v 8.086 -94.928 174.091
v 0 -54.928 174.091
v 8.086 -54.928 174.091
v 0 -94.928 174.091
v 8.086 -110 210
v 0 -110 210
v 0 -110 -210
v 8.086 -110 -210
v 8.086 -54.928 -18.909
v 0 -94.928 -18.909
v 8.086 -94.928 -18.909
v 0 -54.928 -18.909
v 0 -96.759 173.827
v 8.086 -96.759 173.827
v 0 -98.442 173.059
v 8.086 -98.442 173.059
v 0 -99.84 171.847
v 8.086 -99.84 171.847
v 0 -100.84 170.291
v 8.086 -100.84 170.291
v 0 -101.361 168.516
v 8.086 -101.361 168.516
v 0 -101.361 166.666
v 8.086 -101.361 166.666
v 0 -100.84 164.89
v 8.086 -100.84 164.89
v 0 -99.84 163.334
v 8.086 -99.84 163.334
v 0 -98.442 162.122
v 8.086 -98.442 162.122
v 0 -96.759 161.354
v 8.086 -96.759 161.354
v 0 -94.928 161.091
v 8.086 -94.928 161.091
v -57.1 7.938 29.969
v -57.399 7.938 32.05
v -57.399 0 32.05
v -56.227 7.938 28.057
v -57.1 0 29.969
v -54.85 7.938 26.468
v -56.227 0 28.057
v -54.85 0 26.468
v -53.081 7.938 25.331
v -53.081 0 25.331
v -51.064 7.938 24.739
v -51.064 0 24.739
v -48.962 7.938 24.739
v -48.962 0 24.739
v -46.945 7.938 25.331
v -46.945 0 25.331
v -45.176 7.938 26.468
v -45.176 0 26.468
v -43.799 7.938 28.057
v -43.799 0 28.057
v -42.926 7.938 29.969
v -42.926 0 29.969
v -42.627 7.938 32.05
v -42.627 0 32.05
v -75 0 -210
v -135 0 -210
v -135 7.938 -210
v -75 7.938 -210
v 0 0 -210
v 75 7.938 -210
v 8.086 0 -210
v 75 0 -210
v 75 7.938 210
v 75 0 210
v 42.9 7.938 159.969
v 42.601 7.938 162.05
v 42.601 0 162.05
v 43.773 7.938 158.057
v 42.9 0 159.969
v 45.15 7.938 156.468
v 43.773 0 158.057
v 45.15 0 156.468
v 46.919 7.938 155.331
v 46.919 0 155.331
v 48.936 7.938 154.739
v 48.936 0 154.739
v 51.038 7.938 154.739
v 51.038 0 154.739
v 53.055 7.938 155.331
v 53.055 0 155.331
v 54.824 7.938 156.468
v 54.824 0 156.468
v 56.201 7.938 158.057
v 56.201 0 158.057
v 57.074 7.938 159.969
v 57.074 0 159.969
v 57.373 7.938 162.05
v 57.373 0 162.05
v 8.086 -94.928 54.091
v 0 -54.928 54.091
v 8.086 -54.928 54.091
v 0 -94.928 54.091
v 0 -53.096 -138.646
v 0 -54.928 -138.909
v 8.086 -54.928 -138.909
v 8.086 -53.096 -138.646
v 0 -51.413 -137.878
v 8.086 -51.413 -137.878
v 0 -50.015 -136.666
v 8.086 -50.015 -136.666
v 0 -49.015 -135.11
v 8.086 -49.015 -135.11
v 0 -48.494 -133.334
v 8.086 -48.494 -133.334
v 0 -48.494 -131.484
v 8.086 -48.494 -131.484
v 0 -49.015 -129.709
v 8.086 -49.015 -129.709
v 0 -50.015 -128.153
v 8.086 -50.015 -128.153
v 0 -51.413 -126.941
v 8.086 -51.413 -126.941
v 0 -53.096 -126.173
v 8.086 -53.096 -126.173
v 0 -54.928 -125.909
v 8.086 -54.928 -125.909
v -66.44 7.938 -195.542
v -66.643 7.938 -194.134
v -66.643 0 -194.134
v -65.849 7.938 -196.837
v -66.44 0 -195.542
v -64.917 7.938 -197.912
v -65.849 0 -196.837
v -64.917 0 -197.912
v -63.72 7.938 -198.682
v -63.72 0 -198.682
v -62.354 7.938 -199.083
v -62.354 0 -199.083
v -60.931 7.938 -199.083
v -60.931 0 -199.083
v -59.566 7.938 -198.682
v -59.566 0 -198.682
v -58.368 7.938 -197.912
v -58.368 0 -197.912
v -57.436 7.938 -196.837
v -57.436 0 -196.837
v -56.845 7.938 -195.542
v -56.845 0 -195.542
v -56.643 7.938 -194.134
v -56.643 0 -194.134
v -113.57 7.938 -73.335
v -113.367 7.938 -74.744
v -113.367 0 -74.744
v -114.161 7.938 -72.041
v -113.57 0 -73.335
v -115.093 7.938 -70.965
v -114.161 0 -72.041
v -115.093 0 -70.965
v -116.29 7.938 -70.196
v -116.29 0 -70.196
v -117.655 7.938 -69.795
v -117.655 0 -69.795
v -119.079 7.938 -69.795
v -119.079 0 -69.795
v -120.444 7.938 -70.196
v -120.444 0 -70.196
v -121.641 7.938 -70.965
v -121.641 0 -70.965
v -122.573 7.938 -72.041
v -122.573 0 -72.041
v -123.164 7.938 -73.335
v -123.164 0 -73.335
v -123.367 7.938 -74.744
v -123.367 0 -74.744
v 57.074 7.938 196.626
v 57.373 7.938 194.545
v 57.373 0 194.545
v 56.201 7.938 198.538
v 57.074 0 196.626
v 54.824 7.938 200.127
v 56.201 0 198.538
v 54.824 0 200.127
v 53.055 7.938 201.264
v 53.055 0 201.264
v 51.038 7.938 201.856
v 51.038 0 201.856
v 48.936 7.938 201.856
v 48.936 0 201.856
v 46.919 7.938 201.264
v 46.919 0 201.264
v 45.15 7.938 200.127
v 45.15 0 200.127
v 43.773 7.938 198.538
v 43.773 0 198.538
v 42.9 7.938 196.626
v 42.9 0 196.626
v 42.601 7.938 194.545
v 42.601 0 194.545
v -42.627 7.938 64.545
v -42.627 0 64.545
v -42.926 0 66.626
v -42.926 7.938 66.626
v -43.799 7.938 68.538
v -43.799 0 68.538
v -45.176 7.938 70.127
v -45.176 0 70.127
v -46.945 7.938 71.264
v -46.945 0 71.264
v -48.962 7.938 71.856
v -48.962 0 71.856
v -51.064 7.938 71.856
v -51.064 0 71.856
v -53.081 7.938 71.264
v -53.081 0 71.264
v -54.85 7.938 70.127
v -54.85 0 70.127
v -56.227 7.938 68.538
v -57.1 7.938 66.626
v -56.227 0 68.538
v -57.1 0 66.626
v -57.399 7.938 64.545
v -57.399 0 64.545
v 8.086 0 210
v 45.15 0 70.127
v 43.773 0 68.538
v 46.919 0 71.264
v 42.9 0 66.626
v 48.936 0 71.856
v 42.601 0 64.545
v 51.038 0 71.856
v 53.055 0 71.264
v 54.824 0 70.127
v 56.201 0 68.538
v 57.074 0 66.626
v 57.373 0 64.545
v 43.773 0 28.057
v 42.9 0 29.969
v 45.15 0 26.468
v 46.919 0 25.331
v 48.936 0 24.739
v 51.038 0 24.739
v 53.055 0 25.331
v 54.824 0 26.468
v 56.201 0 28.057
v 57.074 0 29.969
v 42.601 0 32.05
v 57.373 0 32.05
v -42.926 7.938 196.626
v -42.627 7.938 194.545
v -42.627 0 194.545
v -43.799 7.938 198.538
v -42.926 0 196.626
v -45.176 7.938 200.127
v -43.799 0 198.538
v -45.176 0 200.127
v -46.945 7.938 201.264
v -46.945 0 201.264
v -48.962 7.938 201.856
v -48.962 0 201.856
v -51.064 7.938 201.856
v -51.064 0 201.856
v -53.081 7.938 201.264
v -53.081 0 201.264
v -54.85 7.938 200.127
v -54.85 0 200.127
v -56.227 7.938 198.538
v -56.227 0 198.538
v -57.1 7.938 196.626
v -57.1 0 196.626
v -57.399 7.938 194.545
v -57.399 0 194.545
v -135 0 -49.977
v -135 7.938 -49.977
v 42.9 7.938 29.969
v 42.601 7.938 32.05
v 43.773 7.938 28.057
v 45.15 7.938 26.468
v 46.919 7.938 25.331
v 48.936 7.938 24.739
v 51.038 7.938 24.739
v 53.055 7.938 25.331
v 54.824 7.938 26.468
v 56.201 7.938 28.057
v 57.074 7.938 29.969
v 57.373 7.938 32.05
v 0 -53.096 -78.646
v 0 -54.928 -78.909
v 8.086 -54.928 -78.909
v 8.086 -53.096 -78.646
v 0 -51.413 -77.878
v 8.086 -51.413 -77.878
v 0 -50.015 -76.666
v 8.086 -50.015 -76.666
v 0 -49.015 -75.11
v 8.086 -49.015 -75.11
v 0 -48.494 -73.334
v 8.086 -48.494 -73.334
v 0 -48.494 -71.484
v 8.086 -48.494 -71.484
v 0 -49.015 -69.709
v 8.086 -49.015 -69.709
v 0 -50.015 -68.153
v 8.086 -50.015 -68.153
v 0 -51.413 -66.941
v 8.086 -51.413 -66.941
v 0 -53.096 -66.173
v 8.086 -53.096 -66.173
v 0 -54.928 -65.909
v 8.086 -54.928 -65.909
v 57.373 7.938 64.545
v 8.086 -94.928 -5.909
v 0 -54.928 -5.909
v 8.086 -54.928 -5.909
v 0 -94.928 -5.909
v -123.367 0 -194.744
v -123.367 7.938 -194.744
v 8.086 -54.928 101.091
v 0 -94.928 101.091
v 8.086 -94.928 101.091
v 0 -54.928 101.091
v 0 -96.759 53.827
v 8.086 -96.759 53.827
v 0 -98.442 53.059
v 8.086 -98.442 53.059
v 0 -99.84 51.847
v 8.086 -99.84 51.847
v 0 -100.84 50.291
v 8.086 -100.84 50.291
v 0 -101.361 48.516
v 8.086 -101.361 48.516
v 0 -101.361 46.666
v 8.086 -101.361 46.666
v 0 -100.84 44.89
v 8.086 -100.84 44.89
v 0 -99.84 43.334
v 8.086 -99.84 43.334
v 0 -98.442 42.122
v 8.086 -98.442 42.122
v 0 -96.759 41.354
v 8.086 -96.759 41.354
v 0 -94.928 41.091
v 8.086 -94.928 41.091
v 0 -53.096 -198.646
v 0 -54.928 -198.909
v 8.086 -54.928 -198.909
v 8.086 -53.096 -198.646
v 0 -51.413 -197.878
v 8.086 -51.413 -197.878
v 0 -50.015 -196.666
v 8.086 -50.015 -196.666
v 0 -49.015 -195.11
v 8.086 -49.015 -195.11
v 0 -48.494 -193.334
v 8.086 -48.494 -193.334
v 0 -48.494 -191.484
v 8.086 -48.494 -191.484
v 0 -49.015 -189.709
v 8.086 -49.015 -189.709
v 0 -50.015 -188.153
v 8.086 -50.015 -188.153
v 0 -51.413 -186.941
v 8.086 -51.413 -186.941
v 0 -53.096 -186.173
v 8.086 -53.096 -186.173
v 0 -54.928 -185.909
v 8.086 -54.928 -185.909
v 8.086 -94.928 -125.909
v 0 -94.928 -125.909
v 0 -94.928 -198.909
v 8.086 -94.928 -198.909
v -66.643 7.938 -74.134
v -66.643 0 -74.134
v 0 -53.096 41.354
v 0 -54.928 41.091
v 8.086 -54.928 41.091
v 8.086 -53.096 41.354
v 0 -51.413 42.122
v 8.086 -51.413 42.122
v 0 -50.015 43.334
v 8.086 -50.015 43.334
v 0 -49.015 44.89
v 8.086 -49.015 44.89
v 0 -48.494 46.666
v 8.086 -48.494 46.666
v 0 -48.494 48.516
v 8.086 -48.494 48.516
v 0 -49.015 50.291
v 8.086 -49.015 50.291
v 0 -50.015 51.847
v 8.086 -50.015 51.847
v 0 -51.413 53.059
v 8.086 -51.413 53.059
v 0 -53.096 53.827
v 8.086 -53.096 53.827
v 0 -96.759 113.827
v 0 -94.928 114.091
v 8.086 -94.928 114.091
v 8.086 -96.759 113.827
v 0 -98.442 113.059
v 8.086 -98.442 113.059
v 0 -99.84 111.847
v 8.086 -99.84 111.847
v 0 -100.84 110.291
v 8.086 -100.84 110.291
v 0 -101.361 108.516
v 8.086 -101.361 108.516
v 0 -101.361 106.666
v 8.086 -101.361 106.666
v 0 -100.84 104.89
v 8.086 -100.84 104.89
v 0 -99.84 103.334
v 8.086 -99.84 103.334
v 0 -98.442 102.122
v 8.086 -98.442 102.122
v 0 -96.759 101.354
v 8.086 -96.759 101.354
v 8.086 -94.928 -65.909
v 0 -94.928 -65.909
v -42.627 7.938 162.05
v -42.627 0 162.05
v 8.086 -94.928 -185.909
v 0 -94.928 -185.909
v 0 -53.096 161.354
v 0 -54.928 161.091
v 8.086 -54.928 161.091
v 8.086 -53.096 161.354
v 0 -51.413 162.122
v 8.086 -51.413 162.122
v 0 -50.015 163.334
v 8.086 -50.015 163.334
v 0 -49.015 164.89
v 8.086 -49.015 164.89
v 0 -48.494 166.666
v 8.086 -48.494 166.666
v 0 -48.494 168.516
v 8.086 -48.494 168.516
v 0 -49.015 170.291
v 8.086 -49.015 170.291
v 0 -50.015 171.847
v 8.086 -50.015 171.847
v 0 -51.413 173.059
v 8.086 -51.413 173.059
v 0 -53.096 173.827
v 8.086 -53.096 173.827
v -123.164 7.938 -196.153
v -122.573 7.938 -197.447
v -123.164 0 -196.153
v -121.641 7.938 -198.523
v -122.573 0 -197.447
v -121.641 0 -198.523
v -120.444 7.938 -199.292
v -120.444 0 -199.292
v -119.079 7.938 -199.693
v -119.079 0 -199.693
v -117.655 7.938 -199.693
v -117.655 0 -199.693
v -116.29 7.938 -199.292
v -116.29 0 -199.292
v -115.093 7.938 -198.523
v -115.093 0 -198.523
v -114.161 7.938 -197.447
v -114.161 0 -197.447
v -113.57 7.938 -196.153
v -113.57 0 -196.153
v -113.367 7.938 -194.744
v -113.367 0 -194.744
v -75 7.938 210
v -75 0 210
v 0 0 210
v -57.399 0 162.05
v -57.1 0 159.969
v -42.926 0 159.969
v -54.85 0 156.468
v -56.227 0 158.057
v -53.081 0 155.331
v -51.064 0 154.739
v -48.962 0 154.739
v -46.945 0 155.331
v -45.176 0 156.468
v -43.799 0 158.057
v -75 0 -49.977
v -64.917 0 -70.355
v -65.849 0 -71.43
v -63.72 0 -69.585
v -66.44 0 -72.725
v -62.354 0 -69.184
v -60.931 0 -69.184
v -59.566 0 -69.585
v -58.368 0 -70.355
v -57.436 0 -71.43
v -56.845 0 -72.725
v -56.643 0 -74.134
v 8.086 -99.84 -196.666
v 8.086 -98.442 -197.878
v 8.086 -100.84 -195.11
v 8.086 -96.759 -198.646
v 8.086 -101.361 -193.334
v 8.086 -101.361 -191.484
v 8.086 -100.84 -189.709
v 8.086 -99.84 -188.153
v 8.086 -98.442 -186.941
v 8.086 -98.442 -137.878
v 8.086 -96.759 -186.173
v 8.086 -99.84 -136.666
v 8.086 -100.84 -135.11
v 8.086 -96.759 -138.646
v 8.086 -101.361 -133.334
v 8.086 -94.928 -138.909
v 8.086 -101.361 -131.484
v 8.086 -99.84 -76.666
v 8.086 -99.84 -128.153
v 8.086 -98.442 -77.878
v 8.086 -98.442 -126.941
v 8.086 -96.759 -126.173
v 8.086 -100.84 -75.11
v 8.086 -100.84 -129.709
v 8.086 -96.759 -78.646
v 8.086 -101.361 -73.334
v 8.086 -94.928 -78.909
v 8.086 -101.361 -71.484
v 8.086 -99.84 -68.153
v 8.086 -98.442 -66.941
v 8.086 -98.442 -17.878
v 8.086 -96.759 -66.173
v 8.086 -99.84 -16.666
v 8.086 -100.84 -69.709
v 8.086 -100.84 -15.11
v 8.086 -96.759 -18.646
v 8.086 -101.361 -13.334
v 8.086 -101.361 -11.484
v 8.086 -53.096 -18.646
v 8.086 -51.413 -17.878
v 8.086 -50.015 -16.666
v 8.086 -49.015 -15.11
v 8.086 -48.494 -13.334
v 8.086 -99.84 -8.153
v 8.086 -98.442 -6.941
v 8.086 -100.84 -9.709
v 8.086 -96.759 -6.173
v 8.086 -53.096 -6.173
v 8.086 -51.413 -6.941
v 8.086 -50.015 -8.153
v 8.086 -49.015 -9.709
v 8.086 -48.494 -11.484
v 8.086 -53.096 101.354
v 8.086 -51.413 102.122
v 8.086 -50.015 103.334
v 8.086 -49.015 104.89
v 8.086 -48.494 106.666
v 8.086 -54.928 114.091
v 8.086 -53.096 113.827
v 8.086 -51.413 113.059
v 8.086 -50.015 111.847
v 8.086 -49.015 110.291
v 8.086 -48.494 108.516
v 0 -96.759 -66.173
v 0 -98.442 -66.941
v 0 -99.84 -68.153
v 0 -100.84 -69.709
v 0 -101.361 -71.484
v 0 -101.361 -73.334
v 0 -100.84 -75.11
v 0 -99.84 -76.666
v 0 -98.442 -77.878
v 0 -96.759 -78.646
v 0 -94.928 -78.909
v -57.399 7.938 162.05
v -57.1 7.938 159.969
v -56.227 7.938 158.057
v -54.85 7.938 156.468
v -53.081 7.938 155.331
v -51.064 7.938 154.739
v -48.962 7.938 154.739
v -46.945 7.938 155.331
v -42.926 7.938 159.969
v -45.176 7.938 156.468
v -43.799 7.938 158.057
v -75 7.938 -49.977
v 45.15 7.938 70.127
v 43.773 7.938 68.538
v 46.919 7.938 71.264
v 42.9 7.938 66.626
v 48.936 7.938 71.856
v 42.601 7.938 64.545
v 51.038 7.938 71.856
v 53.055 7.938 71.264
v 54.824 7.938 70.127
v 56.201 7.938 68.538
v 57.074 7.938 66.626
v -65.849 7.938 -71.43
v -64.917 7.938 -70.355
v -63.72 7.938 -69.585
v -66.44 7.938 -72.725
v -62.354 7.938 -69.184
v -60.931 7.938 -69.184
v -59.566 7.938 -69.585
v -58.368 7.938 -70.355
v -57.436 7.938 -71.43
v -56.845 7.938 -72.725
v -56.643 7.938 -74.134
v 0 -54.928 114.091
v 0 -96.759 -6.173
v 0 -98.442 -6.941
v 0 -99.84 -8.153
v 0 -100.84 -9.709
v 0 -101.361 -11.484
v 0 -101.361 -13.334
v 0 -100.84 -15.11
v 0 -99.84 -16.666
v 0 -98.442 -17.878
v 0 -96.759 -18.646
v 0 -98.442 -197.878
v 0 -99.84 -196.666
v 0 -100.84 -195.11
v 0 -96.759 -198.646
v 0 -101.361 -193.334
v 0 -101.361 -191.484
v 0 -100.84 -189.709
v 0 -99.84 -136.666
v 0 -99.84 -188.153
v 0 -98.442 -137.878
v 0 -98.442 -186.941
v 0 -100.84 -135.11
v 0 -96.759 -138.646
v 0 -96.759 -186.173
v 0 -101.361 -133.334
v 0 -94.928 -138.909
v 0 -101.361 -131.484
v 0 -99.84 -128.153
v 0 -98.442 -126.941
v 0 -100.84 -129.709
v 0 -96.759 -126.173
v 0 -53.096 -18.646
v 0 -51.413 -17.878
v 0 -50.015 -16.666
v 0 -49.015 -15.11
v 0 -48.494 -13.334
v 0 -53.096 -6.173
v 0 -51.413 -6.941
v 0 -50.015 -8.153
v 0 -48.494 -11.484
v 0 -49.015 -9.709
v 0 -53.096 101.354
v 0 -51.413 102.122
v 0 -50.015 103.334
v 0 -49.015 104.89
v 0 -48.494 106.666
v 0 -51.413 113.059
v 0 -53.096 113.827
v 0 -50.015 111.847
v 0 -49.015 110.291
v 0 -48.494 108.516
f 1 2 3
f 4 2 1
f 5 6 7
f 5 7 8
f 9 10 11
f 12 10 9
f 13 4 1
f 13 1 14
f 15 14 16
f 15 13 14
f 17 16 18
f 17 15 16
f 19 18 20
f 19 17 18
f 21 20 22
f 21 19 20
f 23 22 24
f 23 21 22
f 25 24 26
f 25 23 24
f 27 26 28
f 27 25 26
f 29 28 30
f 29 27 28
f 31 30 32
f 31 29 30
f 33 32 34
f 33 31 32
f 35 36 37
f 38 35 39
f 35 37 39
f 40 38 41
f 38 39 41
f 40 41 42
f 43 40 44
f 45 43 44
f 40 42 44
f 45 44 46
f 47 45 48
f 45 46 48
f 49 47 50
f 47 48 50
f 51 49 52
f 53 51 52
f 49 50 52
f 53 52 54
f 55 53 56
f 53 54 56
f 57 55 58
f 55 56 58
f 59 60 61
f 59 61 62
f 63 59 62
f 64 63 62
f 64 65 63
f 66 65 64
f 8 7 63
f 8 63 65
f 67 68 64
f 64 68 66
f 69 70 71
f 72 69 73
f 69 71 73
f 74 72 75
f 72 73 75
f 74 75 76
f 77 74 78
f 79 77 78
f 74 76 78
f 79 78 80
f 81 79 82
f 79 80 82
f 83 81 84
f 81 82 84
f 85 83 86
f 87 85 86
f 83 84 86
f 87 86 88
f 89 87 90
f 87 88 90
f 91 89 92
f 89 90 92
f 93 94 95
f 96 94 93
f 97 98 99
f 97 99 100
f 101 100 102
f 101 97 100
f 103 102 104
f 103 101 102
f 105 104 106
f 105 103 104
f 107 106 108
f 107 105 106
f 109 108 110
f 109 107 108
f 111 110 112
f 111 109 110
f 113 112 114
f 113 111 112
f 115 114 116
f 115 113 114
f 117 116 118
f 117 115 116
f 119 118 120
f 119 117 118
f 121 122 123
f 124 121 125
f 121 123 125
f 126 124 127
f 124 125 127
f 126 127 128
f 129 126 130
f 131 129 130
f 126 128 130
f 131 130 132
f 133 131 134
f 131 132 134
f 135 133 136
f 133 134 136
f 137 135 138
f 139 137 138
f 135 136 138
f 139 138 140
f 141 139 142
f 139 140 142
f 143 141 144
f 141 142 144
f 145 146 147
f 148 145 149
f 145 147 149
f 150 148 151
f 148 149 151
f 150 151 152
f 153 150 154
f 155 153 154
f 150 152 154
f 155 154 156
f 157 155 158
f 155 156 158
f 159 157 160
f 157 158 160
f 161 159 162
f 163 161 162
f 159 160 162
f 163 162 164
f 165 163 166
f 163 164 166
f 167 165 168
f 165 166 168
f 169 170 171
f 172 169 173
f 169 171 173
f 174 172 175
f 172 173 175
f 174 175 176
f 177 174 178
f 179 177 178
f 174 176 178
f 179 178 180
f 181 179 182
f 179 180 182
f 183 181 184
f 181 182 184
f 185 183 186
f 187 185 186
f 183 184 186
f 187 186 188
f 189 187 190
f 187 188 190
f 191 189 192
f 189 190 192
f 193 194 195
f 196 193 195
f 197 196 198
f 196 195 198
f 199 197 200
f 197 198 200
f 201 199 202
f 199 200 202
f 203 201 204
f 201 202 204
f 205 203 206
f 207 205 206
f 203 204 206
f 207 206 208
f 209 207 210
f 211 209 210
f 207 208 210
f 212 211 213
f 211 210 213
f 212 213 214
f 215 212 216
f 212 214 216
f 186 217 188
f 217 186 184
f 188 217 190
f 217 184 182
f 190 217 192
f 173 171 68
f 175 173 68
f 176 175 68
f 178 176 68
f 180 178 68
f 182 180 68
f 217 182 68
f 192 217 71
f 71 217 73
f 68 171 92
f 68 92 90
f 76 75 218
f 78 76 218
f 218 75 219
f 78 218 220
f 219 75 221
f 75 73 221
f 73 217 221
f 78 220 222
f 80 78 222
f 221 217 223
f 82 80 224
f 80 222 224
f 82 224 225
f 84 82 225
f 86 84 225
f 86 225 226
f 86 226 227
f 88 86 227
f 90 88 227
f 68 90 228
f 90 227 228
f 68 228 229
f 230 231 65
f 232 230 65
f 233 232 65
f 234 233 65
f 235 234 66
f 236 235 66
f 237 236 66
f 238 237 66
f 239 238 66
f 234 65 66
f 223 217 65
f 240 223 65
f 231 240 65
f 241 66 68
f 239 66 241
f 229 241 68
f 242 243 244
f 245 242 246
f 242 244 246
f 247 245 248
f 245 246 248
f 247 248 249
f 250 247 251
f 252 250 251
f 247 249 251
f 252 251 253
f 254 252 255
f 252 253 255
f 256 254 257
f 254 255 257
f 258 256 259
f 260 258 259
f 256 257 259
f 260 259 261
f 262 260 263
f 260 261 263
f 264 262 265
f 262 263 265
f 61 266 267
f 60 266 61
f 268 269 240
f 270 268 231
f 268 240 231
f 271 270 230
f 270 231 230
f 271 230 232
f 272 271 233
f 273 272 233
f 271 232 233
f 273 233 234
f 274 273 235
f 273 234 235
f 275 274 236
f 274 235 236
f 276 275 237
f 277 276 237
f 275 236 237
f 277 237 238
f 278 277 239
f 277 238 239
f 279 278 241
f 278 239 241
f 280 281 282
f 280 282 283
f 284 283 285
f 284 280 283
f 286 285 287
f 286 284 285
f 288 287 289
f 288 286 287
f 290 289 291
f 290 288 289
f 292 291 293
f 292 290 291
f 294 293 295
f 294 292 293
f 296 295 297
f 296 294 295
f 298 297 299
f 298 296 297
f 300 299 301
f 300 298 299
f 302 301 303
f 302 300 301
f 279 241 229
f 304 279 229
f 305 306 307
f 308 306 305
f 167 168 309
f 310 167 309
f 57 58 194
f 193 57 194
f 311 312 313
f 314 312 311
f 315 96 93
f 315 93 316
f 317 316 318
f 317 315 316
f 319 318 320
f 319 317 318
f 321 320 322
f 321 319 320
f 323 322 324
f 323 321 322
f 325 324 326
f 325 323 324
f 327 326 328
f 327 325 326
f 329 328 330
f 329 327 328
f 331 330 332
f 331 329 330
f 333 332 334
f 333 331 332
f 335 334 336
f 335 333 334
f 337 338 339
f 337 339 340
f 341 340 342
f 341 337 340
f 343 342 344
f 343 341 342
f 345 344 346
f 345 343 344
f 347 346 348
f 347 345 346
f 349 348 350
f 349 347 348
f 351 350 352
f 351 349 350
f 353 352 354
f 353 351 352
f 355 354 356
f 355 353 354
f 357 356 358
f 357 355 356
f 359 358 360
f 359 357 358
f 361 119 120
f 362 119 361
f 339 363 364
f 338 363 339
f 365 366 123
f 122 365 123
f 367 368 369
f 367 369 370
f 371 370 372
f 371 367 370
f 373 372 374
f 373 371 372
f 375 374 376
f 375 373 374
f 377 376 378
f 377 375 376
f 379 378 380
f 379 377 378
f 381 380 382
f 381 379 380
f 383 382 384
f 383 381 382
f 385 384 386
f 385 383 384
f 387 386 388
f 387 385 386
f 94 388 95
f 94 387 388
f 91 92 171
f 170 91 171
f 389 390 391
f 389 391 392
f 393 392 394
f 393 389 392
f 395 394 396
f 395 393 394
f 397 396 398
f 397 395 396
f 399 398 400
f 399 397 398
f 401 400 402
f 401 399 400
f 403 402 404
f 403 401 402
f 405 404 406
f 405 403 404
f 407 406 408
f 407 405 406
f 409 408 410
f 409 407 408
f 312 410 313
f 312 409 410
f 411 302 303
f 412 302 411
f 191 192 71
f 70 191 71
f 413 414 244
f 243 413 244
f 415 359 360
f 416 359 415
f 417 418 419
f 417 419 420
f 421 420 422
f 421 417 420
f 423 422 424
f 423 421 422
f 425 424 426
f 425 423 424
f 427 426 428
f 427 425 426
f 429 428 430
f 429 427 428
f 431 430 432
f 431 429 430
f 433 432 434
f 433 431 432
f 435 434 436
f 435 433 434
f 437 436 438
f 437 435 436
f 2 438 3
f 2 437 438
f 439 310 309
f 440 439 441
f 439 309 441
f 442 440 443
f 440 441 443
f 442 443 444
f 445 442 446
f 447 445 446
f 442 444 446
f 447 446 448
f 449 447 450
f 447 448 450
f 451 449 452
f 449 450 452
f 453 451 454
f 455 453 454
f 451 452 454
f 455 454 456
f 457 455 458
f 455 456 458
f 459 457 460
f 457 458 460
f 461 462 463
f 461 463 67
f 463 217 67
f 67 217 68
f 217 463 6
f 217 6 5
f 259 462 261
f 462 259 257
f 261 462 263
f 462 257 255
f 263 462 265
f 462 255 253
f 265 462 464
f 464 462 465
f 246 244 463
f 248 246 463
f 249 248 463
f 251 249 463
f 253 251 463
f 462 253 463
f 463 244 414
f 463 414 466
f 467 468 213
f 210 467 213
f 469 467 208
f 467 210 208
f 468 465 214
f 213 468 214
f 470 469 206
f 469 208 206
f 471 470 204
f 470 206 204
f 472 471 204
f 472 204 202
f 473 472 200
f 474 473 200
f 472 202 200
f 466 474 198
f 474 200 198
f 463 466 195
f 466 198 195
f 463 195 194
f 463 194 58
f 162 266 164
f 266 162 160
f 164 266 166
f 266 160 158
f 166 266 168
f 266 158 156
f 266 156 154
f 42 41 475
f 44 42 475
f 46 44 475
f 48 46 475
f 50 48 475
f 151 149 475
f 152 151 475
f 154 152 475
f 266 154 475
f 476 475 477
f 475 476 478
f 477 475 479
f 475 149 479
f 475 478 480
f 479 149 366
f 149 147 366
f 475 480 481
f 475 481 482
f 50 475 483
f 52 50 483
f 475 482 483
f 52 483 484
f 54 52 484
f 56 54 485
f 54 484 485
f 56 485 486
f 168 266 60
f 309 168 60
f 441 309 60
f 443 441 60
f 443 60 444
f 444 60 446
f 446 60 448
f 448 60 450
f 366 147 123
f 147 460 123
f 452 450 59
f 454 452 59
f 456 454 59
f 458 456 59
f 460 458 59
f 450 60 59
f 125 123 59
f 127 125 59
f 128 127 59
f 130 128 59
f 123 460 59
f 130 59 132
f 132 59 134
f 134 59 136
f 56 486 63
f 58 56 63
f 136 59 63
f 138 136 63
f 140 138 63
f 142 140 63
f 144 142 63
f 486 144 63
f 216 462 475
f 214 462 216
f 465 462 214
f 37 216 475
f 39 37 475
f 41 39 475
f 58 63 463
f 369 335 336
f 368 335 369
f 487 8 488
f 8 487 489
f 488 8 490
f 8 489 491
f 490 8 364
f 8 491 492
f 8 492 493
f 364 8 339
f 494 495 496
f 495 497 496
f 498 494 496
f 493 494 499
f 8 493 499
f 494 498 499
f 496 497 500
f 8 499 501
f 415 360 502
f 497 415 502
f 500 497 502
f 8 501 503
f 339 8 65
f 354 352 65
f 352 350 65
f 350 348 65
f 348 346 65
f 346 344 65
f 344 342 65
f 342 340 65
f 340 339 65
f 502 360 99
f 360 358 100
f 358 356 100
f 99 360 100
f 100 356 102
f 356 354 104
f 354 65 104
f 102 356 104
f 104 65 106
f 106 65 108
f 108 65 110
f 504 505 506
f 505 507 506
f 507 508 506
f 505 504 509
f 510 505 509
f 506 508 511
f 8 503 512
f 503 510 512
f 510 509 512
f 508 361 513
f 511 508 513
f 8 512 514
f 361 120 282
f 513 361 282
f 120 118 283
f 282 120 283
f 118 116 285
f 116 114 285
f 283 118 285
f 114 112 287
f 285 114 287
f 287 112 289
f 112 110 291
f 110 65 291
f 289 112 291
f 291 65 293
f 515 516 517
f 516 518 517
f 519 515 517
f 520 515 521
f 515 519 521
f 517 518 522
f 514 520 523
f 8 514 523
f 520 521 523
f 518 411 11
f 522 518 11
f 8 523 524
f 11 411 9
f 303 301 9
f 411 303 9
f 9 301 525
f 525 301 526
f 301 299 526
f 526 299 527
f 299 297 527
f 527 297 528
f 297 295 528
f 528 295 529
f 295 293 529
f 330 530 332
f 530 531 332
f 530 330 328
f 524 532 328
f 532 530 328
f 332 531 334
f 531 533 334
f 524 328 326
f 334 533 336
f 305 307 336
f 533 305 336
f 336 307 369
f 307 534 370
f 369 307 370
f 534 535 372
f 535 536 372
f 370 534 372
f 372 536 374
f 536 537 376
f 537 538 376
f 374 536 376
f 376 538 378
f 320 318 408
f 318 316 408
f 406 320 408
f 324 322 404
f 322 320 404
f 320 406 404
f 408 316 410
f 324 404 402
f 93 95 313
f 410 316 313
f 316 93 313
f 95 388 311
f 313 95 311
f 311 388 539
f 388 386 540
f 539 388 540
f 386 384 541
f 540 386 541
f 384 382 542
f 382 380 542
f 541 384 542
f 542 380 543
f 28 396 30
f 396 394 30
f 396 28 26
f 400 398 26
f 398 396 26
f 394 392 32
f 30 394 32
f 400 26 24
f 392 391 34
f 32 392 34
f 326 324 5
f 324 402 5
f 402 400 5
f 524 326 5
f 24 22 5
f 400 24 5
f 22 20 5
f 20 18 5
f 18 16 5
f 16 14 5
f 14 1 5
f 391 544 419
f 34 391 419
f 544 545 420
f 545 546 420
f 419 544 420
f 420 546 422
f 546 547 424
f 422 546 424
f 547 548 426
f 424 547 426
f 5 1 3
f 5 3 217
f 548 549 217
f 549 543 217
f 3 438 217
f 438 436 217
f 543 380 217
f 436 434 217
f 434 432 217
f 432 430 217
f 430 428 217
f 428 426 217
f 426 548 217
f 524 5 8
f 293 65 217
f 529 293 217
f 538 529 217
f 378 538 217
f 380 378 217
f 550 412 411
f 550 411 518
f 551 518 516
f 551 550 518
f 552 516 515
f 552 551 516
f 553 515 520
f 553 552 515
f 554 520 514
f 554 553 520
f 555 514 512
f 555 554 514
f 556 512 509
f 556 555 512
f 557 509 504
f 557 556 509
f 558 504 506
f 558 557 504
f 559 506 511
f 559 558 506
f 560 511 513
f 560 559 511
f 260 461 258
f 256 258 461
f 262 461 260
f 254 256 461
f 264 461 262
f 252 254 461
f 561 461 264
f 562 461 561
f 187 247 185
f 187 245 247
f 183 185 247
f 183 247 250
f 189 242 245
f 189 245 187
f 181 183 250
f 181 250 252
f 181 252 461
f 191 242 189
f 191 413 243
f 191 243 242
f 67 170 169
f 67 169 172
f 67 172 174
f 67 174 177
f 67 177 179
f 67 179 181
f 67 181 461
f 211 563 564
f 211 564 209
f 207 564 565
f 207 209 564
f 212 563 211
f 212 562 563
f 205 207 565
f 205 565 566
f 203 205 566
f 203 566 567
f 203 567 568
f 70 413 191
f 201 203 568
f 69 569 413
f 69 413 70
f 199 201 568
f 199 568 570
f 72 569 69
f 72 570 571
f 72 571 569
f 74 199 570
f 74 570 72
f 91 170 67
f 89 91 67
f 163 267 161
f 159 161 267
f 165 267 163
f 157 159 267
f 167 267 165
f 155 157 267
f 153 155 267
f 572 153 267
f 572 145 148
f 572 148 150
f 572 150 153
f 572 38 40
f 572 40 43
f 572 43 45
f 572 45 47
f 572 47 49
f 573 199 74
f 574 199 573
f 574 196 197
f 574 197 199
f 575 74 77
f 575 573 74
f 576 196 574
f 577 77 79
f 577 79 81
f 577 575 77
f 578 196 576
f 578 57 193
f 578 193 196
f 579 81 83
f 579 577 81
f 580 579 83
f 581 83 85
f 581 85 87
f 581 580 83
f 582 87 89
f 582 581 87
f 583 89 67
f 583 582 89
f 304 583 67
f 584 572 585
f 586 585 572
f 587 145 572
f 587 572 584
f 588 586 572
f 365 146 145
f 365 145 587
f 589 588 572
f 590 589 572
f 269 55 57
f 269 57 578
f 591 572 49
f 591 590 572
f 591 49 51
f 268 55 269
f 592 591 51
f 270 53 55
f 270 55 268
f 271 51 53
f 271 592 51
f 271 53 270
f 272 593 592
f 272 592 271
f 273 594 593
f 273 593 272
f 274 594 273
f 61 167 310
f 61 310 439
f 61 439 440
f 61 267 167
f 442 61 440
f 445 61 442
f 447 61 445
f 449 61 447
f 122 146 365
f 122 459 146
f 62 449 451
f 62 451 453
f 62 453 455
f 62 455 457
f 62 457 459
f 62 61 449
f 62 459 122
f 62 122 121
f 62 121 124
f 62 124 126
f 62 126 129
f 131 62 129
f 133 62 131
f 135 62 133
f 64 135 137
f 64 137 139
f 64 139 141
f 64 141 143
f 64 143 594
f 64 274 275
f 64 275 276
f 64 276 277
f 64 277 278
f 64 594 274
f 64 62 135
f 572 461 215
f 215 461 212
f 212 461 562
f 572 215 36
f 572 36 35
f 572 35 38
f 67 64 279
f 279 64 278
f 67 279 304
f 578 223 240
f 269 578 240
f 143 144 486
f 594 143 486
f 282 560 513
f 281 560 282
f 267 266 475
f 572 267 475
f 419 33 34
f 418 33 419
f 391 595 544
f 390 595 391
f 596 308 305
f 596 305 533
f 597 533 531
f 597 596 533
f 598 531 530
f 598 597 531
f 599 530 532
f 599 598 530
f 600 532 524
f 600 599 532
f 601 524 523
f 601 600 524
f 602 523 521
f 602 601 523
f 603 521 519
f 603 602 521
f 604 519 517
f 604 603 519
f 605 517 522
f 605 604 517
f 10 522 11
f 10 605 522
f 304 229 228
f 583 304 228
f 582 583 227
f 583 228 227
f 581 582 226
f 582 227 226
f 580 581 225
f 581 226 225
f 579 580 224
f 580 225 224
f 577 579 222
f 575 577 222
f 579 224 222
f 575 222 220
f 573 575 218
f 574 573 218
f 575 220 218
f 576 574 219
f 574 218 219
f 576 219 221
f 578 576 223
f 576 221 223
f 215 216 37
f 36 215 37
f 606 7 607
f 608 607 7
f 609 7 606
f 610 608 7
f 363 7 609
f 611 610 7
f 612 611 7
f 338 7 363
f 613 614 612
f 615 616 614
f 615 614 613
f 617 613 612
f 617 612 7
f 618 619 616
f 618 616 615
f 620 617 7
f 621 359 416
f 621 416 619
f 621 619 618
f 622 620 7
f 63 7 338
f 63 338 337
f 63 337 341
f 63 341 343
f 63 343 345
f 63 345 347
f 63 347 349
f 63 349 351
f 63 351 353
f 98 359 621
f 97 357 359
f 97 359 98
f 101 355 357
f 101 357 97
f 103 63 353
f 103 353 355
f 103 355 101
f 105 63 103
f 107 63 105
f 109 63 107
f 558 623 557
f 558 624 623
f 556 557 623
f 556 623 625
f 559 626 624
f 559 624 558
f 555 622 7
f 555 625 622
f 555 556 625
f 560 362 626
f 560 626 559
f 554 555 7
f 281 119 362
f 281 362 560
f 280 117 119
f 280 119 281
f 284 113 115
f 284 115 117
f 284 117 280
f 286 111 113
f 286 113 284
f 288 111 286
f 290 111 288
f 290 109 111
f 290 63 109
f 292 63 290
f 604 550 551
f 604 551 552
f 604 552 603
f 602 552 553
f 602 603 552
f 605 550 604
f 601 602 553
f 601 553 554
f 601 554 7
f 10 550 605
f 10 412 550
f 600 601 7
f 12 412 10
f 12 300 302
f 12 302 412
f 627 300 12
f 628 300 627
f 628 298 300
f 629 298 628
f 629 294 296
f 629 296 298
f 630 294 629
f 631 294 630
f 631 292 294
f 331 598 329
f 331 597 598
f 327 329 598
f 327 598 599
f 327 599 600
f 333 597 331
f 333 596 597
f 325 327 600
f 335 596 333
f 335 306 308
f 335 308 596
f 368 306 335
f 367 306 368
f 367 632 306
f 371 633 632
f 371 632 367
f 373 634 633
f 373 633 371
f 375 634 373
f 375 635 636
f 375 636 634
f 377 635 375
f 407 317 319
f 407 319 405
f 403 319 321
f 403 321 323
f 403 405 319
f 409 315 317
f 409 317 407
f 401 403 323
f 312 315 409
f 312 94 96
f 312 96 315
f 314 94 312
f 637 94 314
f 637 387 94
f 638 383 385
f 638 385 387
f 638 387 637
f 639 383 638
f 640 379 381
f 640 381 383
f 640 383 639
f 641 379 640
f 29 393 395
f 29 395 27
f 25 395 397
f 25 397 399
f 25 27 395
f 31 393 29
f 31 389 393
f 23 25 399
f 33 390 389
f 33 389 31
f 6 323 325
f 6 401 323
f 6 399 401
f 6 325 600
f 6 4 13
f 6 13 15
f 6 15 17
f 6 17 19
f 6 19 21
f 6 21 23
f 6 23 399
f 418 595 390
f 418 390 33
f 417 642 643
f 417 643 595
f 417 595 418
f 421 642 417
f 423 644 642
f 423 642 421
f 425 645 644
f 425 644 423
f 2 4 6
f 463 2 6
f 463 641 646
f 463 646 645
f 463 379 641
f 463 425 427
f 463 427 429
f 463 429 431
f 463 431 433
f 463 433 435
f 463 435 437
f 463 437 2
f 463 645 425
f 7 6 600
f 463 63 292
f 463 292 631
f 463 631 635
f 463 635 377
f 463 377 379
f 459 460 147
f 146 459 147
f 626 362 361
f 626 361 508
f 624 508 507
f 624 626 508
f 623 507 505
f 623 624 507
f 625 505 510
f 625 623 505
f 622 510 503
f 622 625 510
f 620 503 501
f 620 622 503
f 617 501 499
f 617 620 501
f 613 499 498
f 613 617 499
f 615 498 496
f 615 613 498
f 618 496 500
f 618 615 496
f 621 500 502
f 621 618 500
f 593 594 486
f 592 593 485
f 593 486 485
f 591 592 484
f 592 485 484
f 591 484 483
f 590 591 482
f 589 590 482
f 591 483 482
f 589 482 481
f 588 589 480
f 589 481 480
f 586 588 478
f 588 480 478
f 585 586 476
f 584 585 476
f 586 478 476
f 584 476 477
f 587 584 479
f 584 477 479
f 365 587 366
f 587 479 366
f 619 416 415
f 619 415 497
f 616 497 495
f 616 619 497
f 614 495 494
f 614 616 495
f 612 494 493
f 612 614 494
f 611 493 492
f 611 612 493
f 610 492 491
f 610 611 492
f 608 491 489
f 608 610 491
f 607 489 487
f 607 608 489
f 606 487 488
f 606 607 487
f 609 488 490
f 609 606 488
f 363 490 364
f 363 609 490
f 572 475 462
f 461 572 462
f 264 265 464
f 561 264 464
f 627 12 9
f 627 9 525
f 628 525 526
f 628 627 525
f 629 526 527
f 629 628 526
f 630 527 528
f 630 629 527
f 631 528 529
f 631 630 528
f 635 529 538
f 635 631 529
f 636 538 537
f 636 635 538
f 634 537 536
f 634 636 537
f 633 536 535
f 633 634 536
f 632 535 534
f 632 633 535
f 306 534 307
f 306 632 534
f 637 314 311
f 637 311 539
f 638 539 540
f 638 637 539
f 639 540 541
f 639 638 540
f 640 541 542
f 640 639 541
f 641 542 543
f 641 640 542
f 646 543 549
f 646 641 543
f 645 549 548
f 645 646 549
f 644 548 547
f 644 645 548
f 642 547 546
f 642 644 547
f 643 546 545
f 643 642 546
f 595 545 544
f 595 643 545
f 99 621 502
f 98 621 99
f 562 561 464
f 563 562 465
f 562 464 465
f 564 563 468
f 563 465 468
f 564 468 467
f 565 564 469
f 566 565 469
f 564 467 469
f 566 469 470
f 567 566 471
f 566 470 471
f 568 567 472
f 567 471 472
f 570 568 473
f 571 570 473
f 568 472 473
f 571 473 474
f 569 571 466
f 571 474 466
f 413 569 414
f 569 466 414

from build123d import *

# Parameters (mm, degrees)
CROQUIS1_W              = 60
CROQUIS1_H              = 160.023288417
SALIENTE_EXTRUIR1_DEPTH = 7.9375
CROQUIS2_W              = 8.086078182
CROQUIS2_H              = 420
SALIENTE_EXTRUIR2_DEPTH = 110
CORTAR_EXTRUIR1_DEPTH   = 10


with BuildPart() as part:
    # Croquis1 → Saliente-Extruir1 (new body)
    # profile 1 of 2: a face of its own
    with BuildSketch(Plane(origin=(0, 0, 0), x_dir=(1, 0, 0), z_dir=(0, 1, 0))):
        Polygon((75, 210), (-75, 210), (-75, 49.976711583), (-75, -210), (75, -210), align=None)
        with BuildLine():
            ThreePointArc((-42.626797059, -194.544827159), (-50.012947046, -201.930977146), (-57.399097033, -194.544827159))
            Line((-57.399097033, -194.544827159), (-57.399097033, -162.050045053))
            ThreePointArc((-57.399097033, -162.050045053), (-50.012947046, -154.663895066), (-42.626797059, -162.050045053))
            Line((-42.626797059, -162.050045053), (-42.626797059, -194.544827159))
        make_face(mode=Mode.SUBTRACT)
        with BuildLine():
            ThreePointArc((-42.626797059, -64.544827159), (-50.012947046, -71.930977146), (-57.399097033, -64.544827159))
            Line((-57.399097033, -64.544827159), (-57.399097033, -32.050045053))
            ThreePointArc((-57.399097033, -32.050045053), (-50.012947046, -24.663895066), (-42.626797059, -32.050045053))
            Line((-42.626797059, -32.050045053), (-42.626797059, -64.544827159))
        make_face(mode=Mode.SUBTRACT)
        with BuildLine():
            ThreePointArc((57.373202941, -194.544827159), (49.987052954, -201.930977146), (42.600902967, -194.544827159))
            Line((42.600902967, -194.544827159), (42.600902967, -162.050045053))
            ThreePointArc((42.600902967, -162.050045053), (49.987052954, -154.663895066), (57.373202941, -162.050045053))
            Line((57.373202941, -162.050045053), (57.373202941, -194.544827159))
        make_face(mode=Mode.SUBTRACT)
        with BuildLine():
            ThreePointArc((57.373202941, -64.544827159), (49.987052954, -71.930977146), (42.600902967, -64.544827159))
            Line((42.600902967, -64.544827159), (42.600902967, -32.050045053))
            ThreePointArc((42.600902967, -32.050045053), (49.987052954, -24.663895066), (57.373202941, -32.050045053))
            Line((57.373202941, -32.050045053), (57.373202941, -64.544827159))
        make_face(mode=Mode.SUBTRACT)
        with BuildLine():
            ThreePointArc((-66.642728039, 194.133584854), (-61.642728039, 199.133584854), (-56.642728039, 194.133584854))
            Line((-56.642728039, 194.133584854), (-56.642728039, 74.133584854))
            ThreePointArc((-56.642728039, 74.133584854), (-61.642728039, 69.133584854), (-66.642728039, 74.133584854))
            Line((-66.642728039, 74.133584854), (-66.642728039, 194.133584854))
        make_face(mode=Mode.SUBTRACT)
    # profile 2 of 2: a face of its own
    with BuildSketch(Plane(origin=(0, 0, 0), x_dir=(1, 0, 0), z_dir=(0, 1, 0))):
        with Locations((-105, 129.988355791)):
            Rectangle(CROQUIS1_W, CROQUIS1_H)
        with BuildLine():
            ThreePointArc((-123.366972213, 194.743931483), (-118.366972213, 199.743931483), (-113.366972213, 194.743931483))
            Line((-113.366972213, 194.743931483), (-113.366972213, 74.743931483))
            ThreePointArc((-113.366972213, 74.743931483), (-118.366972213, 69.743931483), (-123.366972213, 74.743931483))
            Line((-123.366972213, 74.743931483), (-123.366972213, 194.743931483))
        make_face(mode=Mode.SUBTRACT)
    extrude(amount=SALIENTE_EXTRUIR1_DEPTH)

    # Croquis2 → Saliente-Extruir2 (add)
    with BuildSketch(Plane.XZ):
        with Locations((4.043039091, 0)):
            Rectangle(CROQUIS2_W, CROQUIS2_H)
    extrude(amount=SALIENTE_EXTRUIR2_DEPTH)

    # Croquis3 → Cortar-Extruir1 (cut)
    with BuildSketch(Plane.ZY):
        with BuildLine():
            Line((-185.90944112, -54.927638628), (-185.90944112, -94.927638628))
            ThreePointArc((-185.90944112, -94.927638628), (-192.40944112, -101.427638628), (-198.90944112, -94.927638628))
            Line((-198.90944112, -94.927638628), (-198.90944112, -54.927638628))
            ThreePointArc((-198.90944112, -54.927638628), (-192.40944112, -48.427638628), (-185.90944112, -54.927638628))
        make_face()
        with BuildLine():
            Line((-125.90944112, -54.927638628), (-125.90944112, -94.927638628))
            ThreePointArc((-125.90944112, -94.927638628), (-132.40944112, -101.427638628), (-138.90944112, -94.927638628))
            Line((-138.90944112, -94.927638628), (-138.90944112, -54.927638628))
            ThreePointArc((-138.90944112, -54.927638628), (-132.40944112, -48.427638628), (-125.90944112, -54.927638628))
        make_face()
        with BuildLine():
            Line((-65.90944112, -54.927638628), (-65.90944112, -94.927638628))
            ThreePointArc((-65.90944112, -94.927638628), (-72.40944112, -101.427638628), (-78.90944112, -94.927638628))
            Line((-78.90944112, -94.927638628), (-78.90944112, -54.927638628))
            ThreePointArc((-78.90944112, -54.927638628), (-72.40944112, -48.427638628), (-65.90944112, -54.927638628))
        make_face()
        with BuildLine():
            Line((-5.90944112, -54.927638628), (-5.90944112, -94.927638628))
            ThreePointArc((-5.90944112, -94.927638628), (-12.40944112, -101.427638628), (-18.90944112, -94.927638628))
            Line((-18.90944112, -94.927638628), (-18.90944112, -54.927638628))
            ThreePointArc((-18.90944112, -54.927638628), (-12.40944112, -48.427638628), (-5.90944112, -54.927638628))
        make_face()
        with BuildLine():
            Line((54.09055888, -54.927638628), (54.09055888, -94.927638628))
            ThreePointArc((54.09055888, -94.927638628), (47.59055888, -101.427638628), (41.09055888, -94.927638628))
            Line((41.09055888, -94.927638628), (41.09055888, -54.927638628))
            ThreePointArc((41.09055888, -54.927638628), (47.59055888, -48.427638628), (54.09055888, -54.927638628))
        make_face()
        with BuildLine():
            Line((114.09055888, -54.927638628), (114.09055888, -94.927638628))
            ThreePointArc((114.09055888, -94.927638628), (107.59055888, -101.427638628), (101.09055888, -94.927638628))
            Line((101.09055888, -94.927638628), (101.09055888, -54.927638628))
            ThreePointArc((101.09055888, -54.927638628), (107.59055888, -48.427638628), (114.09055888, -54.927638628))
        make_face()
        with BuildLine():
            Line((174.09055888, -54.927638628), (174.09055888, -94.927638628))
            ThreePointArc((174.09055888, -94.927638628), (167.59055888, -101.427638628), (161.09055888, -94.927638628))
            Line((161.09055888, -94.927638628), (161.09055888, -54.927638628))
            ThreePointArc((161.09055888, -54.927638628), (167.59055888, -48.427638628), (174.09055888, -54.927638628))
        make_face()
    extrude(amount=-CORTAR_EXTRUIR1_DEPTH, mode=Mode.SUBTRACT)


solid = part.part
